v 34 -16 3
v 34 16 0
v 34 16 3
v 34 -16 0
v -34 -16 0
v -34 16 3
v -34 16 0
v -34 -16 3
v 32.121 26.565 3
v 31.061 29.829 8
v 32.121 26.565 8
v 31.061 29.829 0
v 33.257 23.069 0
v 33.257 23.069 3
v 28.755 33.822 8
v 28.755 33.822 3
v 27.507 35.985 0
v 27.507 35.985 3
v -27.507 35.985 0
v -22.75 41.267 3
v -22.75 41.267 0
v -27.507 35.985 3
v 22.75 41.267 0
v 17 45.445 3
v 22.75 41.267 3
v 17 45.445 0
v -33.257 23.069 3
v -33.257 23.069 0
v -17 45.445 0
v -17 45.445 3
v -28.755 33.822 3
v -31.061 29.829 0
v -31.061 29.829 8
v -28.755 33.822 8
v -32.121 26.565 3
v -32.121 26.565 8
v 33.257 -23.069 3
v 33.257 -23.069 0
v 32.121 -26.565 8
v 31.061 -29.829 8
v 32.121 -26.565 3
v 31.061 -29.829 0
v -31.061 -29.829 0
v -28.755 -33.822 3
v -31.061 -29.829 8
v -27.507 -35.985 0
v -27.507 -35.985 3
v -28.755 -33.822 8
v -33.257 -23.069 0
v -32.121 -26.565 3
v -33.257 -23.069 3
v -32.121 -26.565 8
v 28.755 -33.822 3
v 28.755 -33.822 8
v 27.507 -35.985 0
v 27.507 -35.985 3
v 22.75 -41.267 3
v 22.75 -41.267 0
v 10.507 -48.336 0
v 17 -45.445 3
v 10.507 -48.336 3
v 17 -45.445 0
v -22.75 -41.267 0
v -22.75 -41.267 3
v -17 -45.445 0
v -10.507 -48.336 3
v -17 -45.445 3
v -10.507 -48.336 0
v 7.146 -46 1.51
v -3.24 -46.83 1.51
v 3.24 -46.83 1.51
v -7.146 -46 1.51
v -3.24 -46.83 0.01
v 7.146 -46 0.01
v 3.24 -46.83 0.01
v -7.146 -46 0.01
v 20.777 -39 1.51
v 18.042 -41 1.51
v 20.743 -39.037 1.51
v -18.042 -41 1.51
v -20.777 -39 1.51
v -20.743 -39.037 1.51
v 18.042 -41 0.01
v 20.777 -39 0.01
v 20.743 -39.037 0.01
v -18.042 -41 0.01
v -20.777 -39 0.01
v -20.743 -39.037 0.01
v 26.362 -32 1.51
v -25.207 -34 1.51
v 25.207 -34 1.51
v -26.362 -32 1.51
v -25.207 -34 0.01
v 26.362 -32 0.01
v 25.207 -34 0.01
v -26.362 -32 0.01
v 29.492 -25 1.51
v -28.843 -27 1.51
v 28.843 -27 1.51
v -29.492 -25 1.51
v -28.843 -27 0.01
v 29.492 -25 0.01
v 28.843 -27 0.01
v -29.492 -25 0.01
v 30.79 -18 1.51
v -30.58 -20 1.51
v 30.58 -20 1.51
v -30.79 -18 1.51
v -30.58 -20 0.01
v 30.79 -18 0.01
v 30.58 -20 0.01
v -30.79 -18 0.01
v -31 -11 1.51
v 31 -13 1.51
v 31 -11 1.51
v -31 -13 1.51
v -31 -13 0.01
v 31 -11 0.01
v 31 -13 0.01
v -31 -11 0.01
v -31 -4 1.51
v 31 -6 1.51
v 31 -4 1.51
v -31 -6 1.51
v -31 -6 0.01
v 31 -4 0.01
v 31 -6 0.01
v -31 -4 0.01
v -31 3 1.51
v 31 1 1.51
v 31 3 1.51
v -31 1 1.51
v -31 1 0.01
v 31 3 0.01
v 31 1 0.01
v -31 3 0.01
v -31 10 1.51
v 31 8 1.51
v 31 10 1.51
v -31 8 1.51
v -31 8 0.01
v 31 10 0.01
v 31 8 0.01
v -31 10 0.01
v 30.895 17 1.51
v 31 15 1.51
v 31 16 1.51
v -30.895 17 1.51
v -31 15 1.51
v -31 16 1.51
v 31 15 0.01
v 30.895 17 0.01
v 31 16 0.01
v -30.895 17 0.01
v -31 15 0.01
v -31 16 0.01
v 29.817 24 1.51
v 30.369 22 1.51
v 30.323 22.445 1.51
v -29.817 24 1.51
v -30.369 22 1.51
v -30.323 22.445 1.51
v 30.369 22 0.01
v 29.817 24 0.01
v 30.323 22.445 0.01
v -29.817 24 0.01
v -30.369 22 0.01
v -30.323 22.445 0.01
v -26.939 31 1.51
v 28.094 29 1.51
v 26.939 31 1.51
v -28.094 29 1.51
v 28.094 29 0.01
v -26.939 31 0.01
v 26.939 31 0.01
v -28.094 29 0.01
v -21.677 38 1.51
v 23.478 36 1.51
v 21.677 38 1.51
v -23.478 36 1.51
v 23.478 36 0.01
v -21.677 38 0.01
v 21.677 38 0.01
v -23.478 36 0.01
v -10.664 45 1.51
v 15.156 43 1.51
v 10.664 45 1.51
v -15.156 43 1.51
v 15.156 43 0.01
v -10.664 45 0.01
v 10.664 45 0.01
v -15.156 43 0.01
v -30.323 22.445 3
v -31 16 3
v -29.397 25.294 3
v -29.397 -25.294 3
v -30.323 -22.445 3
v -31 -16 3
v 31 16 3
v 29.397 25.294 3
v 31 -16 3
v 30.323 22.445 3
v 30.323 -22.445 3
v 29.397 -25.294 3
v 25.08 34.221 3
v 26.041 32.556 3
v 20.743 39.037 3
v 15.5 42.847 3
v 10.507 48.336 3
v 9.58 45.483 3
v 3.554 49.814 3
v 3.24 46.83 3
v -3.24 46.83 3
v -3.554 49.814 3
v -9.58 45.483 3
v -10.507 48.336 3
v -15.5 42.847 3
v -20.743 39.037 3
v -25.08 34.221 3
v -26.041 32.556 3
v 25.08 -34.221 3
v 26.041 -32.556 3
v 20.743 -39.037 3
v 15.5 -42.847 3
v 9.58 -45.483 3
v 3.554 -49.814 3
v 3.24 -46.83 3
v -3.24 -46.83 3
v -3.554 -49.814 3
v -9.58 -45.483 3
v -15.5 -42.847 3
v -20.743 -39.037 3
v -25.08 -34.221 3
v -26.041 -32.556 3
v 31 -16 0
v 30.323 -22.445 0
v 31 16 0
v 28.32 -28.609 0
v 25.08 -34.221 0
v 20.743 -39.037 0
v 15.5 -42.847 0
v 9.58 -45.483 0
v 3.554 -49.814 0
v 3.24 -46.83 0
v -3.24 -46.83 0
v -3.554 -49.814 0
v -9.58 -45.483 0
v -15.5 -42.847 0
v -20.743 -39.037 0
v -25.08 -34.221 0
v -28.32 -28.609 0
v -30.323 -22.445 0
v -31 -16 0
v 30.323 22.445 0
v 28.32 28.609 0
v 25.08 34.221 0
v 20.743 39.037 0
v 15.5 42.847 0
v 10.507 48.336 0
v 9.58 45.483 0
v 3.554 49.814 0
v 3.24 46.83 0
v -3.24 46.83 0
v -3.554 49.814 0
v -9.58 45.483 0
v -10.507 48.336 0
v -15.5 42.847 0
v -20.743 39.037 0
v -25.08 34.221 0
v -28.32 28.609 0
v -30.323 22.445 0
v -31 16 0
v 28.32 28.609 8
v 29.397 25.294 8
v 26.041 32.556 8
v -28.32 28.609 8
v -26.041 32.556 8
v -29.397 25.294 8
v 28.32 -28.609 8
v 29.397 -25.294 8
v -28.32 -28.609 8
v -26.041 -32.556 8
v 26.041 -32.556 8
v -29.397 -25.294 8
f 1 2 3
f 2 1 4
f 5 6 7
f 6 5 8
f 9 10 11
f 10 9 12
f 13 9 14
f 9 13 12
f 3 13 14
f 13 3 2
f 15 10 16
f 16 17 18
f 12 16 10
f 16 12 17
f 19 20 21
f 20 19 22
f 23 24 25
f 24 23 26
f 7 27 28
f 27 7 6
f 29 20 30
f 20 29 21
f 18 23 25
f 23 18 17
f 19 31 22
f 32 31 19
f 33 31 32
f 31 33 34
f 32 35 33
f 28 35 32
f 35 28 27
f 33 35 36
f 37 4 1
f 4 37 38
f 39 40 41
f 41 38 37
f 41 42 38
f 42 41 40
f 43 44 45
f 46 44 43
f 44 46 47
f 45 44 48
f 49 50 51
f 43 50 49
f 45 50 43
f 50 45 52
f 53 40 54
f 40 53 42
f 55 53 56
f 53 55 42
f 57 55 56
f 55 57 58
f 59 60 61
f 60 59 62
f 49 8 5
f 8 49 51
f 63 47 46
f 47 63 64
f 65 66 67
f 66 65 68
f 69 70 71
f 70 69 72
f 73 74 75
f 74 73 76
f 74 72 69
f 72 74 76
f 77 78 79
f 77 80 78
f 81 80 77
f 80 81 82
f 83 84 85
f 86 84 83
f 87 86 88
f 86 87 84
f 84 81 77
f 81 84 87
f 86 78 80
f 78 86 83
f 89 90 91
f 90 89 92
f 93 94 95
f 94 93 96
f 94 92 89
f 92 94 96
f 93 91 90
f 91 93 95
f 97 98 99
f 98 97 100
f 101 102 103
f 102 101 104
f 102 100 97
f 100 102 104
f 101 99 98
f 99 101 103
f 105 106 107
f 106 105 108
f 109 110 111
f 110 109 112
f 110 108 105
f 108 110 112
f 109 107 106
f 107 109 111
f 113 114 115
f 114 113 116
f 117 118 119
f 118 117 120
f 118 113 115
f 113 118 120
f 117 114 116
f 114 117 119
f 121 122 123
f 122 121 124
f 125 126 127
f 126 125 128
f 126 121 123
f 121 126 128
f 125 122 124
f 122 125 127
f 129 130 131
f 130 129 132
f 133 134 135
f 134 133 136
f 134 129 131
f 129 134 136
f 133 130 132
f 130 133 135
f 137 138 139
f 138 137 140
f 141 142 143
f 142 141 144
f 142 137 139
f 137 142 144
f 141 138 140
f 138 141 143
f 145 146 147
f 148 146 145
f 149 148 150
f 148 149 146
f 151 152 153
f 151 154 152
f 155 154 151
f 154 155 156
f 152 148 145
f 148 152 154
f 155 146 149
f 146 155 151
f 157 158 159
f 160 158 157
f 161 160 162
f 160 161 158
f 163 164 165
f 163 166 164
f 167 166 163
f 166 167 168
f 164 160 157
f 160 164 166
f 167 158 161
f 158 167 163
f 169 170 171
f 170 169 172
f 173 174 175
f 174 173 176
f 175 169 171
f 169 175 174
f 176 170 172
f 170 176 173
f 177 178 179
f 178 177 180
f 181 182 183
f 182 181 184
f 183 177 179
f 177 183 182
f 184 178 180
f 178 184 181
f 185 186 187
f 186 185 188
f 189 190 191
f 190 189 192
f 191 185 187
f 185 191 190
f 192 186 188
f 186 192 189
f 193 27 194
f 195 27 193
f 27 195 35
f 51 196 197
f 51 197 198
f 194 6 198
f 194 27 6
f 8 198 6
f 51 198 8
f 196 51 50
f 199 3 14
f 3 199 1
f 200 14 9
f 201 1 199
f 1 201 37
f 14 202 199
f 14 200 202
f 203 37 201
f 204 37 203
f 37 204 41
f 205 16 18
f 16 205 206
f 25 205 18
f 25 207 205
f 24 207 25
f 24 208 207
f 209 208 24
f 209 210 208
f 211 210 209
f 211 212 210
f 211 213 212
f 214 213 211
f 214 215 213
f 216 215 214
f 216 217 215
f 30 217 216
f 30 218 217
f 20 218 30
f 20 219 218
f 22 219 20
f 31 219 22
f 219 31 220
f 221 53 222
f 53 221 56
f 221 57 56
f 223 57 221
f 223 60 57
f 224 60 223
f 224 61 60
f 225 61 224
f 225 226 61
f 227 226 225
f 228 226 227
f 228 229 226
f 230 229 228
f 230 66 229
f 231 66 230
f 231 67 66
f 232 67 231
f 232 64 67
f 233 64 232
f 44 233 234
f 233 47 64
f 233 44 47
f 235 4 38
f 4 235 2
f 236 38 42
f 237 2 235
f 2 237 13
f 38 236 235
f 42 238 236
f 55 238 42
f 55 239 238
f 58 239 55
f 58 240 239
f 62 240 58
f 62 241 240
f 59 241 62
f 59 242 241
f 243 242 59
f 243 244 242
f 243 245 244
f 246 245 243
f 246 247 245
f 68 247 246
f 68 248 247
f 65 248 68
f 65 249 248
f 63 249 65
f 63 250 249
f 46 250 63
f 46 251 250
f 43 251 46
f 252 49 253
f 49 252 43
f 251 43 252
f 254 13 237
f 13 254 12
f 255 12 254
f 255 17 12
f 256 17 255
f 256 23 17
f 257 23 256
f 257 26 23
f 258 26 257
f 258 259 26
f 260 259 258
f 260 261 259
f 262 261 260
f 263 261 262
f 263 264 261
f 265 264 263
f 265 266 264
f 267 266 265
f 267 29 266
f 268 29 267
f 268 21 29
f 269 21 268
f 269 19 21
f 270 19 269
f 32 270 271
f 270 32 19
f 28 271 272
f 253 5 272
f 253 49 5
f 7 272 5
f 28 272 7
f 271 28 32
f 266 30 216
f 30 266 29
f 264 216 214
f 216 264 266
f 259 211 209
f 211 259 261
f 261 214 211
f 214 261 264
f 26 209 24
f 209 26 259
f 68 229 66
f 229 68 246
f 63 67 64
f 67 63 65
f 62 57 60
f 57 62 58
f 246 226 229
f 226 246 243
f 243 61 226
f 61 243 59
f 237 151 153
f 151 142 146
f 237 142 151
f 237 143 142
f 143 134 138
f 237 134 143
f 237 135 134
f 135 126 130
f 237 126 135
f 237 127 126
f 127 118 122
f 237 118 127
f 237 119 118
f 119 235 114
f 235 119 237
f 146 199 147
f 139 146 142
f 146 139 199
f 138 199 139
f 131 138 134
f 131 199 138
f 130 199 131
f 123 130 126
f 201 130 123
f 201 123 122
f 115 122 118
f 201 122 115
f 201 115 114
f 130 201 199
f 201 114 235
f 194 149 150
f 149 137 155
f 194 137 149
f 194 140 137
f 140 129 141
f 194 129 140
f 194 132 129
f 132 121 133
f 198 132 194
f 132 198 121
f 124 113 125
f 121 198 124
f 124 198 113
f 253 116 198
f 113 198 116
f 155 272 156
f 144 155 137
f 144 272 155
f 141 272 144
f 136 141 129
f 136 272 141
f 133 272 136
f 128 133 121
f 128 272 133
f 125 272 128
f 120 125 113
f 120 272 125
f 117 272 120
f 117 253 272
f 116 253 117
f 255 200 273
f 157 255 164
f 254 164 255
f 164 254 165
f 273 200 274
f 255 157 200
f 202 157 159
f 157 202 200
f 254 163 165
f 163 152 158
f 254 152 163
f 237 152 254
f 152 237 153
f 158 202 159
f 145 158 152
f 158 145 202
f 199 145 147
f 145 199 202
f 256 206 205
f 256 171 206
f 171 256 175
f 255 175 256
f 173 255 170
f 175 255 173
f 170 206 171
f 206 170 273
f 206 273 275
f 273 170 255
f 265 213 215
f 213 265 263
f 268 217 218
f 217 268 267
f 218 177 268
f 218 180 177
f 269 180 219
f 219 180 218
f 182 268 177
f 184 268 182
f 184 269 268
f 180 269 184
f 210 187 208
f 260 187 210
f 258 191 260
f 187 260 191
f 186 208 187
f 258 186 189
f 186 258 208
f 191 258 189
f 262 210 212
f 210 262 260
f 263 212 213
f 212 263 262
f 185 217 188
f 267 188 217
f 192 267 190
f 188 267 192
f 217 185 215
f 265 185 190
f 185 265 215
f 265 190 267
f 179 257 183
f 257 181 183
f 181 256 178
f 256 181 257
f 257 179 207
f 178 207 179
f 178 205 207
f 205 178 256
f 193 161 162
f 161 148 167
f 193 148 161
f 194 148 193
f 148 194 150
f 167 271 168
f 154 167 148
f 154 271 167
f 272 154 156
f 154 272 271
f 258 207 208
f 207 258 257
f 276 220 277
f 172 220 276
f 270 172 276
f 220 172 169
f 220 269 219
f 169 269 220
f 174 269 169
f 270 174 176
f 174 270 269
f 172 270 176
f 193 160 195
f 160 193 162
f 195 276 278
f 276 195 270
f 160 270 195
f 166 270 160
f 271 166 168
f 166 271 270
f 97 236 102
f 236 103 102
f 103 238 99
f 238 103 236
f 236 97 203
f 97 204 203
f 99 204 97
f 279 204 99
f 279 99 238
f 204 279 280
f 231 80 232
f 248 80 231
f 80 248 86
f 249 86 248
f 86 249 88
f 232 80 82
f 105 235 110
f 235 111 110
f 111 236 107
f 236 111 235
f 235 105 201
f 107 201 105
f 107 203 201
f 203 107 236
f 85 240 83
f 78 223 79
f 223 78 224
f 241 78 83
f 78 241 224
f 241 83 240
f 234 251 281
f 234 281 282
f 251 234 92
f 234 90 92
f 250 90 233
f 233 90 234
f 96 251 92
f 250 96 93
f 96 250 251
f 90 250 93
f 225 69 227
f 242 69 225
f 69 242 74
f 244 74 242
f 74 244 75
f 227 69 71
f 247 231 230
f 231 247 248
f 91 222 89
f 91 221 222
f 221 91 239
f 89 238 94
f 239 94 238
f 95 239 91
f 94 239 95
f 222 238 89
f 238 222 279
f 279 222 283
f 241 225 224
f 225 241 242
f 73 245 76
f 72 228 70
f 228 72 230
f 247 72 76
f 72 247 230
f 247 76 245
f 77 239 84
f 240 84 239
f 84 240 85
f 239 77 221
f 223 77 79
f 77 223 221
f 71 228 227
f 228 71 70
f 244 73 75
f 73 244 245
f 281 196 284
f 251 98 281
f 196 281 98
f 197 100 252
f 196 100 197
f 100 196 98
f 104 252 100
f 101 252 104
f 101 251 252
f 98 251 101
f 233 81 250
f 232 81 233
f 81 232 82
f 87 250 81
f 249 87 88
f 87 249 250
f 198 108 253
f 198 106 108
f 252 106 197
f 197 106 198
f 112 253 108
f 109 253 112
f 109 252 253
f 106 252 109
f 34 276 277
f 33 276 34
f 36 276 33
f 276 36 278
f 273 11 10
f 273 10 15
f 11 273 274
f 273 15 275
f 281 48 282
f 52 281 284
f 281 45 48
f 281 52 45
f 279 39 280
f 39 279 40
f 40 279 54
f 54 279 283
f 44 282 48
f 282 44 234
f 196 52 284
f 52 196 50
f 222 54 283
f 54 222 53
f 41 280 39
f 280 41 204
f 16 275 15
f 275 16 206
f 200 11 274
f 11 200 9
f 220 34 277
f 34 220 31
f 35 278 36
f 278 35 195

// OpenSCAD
// preview[view:south east, tilt:top diagonal]

/* [Lozenge] */

Width = 68; // [25:200]
Length = 100;// [50:200]
Height = 8;//[4:10]
//*********Declaration of customization variables************
/* [Hidden] */

	//Parameters
	//diameter of the circle, or side of the square
meshscreen_d=Width;
//length of lozenge or rectangle dish
meshscreen_l=Length-Width;
	//width of the solid border around the mesh.
meshscreen_borderwidth=3;
	//thickness of the screen.
meshscreen_h=3;//Height/2; 
	//print layer height
layer_h=0.3;
	//meshthread width. Please keep this a multiple of the width of the thread of 
	//your printer. Use multiple shells in your slicing settings if necessary.
meshthread_w=2;
	//spacing in between mesh threads
mesh_space=5;
default_height=10;
default_border_w=1;
default_width=60;
default_length=160;

meshscreen_lozenge(
h=meshscreen_h,
border_w=meshscreen_borderwidth,
mesh_w=meshthread_w,
mesh_space=mesh_space,
width=meshscreen_d,
length=meshscreen_l,
layer_h=layer_h,
foot_h=Height);
/**********************************/

module meshscreen_lozenge(h=2,border_w=meshscreen_borderwidth,mesh_w=1,mesh_space=2,width=60,length=60,layer_h=0.3,foot_h=6){
union(){
	intersection(){
		translate([0,0,h/2])lozenge(height=h,width=width,length=length);
		mesh_raw(h=h,mesh_w=mesh_w,mesh_space=mesh_space,width=2*max(width,length),layer_height=0.3);
	}
translate([0,0,h/2])	difference(){
		lozenge(height=h,width=width,length=length);
		lozenge(height=foot_h*2,width=width-2*border_w,length=length);
	}
translate([0,0,foot_h/2]) 
intersection(){
	union()
	{
	translate([0,length/2,0])
		rotate([0,0,25])
		translate([0,-foot_h/2,-foot_h/2])
		cube([width,foot_h,foot_h]);
	translate([0,length/2,0])
		rotate([0,0,-25])
		translate([-width,-foot_h/2,-foot_h/2])cube([width,foot_h,foot_h]);
	rotate([0,0,180]){
		translate([0,length/2,0])
			rotate([0,0,25])
			translate([0,-foot_h/2,-foot_h/2])
			cube([width,foot_h,foot_h]);
		translate([0,length/2,0])
			rotate([0,0,-25])
			translate([-width,-foot_h/2,-foot_h/2])
			cube([width,foot_h,foot_h]);
		}
	}
	difference(){
		lozenge(height=foot_h,width=width,length=length);
		lozenge(height=foot_h*2,width=width-2*border_w,length=length);
	}
}
}
}

module lozenge(height=default_height,width=default_width,length=default_length){
union(){
cube([width,length,height],center=true);
translate([0,length/2,-height/2])cylinder(r=width/2,height);
translate([0,-length/2,-height/2])cylinder(r=width/2,height);
}
}

/**********************************/

module meshscreen_square(h=2,border_w=meshscreen_borderwidth,mesh_w=1,mesh_space=2,width=60,layer_h=0.3){
	intersection(){
		translate([0,0,h/2])cube([width,width,h],center=true);
		mesh_raw(h=h,mesh_w=mesh_w,mesh_space=mesh_space,width=width,layer_height=0.3);
	}
	difference(){
		translate([0,0,h/2])cube([width,width,h],center=true);	translate([0,0,h/2])cube([width-border_w*2,width-border_w*2,h*1.1],center=true);
	}
}

/**********************************/

module meshscreen_circle(h=2,border_w=meshscreen_borderwidth,mesh_w=1,mesh_space=2,width=60,layer_h=0.3){
	intersection(){
		cylinder(r=width/2,h);
		mesh_raw(h=h,mesh_w=mesh_w,mesh_space=mesh_space,width=width,layer_height=0.3);
	}
	difference(){
		cylinder(r=width/2,h);
		translate([0,0,-h*0.05])cylinder(r=width/2-border_w,h=h*1.1);
	}
}
module mesh_raw(h=2,mesh_w=1,mesh_space=2,width=50,layer_h=0.3){
	for ( j = [0 :(mesh_w+mesh_space): width] )
	{
	   //	translate([0,0,0.01])translate([-width/2+j, 0, h/4])cube([mesh_w,width,h/2-layer_h/10],center=true);
		translate([0,0,0.01])translate([0, -width/2+j, h/4])cube([width,mesh_w,h/2],center=true);
	}

}
